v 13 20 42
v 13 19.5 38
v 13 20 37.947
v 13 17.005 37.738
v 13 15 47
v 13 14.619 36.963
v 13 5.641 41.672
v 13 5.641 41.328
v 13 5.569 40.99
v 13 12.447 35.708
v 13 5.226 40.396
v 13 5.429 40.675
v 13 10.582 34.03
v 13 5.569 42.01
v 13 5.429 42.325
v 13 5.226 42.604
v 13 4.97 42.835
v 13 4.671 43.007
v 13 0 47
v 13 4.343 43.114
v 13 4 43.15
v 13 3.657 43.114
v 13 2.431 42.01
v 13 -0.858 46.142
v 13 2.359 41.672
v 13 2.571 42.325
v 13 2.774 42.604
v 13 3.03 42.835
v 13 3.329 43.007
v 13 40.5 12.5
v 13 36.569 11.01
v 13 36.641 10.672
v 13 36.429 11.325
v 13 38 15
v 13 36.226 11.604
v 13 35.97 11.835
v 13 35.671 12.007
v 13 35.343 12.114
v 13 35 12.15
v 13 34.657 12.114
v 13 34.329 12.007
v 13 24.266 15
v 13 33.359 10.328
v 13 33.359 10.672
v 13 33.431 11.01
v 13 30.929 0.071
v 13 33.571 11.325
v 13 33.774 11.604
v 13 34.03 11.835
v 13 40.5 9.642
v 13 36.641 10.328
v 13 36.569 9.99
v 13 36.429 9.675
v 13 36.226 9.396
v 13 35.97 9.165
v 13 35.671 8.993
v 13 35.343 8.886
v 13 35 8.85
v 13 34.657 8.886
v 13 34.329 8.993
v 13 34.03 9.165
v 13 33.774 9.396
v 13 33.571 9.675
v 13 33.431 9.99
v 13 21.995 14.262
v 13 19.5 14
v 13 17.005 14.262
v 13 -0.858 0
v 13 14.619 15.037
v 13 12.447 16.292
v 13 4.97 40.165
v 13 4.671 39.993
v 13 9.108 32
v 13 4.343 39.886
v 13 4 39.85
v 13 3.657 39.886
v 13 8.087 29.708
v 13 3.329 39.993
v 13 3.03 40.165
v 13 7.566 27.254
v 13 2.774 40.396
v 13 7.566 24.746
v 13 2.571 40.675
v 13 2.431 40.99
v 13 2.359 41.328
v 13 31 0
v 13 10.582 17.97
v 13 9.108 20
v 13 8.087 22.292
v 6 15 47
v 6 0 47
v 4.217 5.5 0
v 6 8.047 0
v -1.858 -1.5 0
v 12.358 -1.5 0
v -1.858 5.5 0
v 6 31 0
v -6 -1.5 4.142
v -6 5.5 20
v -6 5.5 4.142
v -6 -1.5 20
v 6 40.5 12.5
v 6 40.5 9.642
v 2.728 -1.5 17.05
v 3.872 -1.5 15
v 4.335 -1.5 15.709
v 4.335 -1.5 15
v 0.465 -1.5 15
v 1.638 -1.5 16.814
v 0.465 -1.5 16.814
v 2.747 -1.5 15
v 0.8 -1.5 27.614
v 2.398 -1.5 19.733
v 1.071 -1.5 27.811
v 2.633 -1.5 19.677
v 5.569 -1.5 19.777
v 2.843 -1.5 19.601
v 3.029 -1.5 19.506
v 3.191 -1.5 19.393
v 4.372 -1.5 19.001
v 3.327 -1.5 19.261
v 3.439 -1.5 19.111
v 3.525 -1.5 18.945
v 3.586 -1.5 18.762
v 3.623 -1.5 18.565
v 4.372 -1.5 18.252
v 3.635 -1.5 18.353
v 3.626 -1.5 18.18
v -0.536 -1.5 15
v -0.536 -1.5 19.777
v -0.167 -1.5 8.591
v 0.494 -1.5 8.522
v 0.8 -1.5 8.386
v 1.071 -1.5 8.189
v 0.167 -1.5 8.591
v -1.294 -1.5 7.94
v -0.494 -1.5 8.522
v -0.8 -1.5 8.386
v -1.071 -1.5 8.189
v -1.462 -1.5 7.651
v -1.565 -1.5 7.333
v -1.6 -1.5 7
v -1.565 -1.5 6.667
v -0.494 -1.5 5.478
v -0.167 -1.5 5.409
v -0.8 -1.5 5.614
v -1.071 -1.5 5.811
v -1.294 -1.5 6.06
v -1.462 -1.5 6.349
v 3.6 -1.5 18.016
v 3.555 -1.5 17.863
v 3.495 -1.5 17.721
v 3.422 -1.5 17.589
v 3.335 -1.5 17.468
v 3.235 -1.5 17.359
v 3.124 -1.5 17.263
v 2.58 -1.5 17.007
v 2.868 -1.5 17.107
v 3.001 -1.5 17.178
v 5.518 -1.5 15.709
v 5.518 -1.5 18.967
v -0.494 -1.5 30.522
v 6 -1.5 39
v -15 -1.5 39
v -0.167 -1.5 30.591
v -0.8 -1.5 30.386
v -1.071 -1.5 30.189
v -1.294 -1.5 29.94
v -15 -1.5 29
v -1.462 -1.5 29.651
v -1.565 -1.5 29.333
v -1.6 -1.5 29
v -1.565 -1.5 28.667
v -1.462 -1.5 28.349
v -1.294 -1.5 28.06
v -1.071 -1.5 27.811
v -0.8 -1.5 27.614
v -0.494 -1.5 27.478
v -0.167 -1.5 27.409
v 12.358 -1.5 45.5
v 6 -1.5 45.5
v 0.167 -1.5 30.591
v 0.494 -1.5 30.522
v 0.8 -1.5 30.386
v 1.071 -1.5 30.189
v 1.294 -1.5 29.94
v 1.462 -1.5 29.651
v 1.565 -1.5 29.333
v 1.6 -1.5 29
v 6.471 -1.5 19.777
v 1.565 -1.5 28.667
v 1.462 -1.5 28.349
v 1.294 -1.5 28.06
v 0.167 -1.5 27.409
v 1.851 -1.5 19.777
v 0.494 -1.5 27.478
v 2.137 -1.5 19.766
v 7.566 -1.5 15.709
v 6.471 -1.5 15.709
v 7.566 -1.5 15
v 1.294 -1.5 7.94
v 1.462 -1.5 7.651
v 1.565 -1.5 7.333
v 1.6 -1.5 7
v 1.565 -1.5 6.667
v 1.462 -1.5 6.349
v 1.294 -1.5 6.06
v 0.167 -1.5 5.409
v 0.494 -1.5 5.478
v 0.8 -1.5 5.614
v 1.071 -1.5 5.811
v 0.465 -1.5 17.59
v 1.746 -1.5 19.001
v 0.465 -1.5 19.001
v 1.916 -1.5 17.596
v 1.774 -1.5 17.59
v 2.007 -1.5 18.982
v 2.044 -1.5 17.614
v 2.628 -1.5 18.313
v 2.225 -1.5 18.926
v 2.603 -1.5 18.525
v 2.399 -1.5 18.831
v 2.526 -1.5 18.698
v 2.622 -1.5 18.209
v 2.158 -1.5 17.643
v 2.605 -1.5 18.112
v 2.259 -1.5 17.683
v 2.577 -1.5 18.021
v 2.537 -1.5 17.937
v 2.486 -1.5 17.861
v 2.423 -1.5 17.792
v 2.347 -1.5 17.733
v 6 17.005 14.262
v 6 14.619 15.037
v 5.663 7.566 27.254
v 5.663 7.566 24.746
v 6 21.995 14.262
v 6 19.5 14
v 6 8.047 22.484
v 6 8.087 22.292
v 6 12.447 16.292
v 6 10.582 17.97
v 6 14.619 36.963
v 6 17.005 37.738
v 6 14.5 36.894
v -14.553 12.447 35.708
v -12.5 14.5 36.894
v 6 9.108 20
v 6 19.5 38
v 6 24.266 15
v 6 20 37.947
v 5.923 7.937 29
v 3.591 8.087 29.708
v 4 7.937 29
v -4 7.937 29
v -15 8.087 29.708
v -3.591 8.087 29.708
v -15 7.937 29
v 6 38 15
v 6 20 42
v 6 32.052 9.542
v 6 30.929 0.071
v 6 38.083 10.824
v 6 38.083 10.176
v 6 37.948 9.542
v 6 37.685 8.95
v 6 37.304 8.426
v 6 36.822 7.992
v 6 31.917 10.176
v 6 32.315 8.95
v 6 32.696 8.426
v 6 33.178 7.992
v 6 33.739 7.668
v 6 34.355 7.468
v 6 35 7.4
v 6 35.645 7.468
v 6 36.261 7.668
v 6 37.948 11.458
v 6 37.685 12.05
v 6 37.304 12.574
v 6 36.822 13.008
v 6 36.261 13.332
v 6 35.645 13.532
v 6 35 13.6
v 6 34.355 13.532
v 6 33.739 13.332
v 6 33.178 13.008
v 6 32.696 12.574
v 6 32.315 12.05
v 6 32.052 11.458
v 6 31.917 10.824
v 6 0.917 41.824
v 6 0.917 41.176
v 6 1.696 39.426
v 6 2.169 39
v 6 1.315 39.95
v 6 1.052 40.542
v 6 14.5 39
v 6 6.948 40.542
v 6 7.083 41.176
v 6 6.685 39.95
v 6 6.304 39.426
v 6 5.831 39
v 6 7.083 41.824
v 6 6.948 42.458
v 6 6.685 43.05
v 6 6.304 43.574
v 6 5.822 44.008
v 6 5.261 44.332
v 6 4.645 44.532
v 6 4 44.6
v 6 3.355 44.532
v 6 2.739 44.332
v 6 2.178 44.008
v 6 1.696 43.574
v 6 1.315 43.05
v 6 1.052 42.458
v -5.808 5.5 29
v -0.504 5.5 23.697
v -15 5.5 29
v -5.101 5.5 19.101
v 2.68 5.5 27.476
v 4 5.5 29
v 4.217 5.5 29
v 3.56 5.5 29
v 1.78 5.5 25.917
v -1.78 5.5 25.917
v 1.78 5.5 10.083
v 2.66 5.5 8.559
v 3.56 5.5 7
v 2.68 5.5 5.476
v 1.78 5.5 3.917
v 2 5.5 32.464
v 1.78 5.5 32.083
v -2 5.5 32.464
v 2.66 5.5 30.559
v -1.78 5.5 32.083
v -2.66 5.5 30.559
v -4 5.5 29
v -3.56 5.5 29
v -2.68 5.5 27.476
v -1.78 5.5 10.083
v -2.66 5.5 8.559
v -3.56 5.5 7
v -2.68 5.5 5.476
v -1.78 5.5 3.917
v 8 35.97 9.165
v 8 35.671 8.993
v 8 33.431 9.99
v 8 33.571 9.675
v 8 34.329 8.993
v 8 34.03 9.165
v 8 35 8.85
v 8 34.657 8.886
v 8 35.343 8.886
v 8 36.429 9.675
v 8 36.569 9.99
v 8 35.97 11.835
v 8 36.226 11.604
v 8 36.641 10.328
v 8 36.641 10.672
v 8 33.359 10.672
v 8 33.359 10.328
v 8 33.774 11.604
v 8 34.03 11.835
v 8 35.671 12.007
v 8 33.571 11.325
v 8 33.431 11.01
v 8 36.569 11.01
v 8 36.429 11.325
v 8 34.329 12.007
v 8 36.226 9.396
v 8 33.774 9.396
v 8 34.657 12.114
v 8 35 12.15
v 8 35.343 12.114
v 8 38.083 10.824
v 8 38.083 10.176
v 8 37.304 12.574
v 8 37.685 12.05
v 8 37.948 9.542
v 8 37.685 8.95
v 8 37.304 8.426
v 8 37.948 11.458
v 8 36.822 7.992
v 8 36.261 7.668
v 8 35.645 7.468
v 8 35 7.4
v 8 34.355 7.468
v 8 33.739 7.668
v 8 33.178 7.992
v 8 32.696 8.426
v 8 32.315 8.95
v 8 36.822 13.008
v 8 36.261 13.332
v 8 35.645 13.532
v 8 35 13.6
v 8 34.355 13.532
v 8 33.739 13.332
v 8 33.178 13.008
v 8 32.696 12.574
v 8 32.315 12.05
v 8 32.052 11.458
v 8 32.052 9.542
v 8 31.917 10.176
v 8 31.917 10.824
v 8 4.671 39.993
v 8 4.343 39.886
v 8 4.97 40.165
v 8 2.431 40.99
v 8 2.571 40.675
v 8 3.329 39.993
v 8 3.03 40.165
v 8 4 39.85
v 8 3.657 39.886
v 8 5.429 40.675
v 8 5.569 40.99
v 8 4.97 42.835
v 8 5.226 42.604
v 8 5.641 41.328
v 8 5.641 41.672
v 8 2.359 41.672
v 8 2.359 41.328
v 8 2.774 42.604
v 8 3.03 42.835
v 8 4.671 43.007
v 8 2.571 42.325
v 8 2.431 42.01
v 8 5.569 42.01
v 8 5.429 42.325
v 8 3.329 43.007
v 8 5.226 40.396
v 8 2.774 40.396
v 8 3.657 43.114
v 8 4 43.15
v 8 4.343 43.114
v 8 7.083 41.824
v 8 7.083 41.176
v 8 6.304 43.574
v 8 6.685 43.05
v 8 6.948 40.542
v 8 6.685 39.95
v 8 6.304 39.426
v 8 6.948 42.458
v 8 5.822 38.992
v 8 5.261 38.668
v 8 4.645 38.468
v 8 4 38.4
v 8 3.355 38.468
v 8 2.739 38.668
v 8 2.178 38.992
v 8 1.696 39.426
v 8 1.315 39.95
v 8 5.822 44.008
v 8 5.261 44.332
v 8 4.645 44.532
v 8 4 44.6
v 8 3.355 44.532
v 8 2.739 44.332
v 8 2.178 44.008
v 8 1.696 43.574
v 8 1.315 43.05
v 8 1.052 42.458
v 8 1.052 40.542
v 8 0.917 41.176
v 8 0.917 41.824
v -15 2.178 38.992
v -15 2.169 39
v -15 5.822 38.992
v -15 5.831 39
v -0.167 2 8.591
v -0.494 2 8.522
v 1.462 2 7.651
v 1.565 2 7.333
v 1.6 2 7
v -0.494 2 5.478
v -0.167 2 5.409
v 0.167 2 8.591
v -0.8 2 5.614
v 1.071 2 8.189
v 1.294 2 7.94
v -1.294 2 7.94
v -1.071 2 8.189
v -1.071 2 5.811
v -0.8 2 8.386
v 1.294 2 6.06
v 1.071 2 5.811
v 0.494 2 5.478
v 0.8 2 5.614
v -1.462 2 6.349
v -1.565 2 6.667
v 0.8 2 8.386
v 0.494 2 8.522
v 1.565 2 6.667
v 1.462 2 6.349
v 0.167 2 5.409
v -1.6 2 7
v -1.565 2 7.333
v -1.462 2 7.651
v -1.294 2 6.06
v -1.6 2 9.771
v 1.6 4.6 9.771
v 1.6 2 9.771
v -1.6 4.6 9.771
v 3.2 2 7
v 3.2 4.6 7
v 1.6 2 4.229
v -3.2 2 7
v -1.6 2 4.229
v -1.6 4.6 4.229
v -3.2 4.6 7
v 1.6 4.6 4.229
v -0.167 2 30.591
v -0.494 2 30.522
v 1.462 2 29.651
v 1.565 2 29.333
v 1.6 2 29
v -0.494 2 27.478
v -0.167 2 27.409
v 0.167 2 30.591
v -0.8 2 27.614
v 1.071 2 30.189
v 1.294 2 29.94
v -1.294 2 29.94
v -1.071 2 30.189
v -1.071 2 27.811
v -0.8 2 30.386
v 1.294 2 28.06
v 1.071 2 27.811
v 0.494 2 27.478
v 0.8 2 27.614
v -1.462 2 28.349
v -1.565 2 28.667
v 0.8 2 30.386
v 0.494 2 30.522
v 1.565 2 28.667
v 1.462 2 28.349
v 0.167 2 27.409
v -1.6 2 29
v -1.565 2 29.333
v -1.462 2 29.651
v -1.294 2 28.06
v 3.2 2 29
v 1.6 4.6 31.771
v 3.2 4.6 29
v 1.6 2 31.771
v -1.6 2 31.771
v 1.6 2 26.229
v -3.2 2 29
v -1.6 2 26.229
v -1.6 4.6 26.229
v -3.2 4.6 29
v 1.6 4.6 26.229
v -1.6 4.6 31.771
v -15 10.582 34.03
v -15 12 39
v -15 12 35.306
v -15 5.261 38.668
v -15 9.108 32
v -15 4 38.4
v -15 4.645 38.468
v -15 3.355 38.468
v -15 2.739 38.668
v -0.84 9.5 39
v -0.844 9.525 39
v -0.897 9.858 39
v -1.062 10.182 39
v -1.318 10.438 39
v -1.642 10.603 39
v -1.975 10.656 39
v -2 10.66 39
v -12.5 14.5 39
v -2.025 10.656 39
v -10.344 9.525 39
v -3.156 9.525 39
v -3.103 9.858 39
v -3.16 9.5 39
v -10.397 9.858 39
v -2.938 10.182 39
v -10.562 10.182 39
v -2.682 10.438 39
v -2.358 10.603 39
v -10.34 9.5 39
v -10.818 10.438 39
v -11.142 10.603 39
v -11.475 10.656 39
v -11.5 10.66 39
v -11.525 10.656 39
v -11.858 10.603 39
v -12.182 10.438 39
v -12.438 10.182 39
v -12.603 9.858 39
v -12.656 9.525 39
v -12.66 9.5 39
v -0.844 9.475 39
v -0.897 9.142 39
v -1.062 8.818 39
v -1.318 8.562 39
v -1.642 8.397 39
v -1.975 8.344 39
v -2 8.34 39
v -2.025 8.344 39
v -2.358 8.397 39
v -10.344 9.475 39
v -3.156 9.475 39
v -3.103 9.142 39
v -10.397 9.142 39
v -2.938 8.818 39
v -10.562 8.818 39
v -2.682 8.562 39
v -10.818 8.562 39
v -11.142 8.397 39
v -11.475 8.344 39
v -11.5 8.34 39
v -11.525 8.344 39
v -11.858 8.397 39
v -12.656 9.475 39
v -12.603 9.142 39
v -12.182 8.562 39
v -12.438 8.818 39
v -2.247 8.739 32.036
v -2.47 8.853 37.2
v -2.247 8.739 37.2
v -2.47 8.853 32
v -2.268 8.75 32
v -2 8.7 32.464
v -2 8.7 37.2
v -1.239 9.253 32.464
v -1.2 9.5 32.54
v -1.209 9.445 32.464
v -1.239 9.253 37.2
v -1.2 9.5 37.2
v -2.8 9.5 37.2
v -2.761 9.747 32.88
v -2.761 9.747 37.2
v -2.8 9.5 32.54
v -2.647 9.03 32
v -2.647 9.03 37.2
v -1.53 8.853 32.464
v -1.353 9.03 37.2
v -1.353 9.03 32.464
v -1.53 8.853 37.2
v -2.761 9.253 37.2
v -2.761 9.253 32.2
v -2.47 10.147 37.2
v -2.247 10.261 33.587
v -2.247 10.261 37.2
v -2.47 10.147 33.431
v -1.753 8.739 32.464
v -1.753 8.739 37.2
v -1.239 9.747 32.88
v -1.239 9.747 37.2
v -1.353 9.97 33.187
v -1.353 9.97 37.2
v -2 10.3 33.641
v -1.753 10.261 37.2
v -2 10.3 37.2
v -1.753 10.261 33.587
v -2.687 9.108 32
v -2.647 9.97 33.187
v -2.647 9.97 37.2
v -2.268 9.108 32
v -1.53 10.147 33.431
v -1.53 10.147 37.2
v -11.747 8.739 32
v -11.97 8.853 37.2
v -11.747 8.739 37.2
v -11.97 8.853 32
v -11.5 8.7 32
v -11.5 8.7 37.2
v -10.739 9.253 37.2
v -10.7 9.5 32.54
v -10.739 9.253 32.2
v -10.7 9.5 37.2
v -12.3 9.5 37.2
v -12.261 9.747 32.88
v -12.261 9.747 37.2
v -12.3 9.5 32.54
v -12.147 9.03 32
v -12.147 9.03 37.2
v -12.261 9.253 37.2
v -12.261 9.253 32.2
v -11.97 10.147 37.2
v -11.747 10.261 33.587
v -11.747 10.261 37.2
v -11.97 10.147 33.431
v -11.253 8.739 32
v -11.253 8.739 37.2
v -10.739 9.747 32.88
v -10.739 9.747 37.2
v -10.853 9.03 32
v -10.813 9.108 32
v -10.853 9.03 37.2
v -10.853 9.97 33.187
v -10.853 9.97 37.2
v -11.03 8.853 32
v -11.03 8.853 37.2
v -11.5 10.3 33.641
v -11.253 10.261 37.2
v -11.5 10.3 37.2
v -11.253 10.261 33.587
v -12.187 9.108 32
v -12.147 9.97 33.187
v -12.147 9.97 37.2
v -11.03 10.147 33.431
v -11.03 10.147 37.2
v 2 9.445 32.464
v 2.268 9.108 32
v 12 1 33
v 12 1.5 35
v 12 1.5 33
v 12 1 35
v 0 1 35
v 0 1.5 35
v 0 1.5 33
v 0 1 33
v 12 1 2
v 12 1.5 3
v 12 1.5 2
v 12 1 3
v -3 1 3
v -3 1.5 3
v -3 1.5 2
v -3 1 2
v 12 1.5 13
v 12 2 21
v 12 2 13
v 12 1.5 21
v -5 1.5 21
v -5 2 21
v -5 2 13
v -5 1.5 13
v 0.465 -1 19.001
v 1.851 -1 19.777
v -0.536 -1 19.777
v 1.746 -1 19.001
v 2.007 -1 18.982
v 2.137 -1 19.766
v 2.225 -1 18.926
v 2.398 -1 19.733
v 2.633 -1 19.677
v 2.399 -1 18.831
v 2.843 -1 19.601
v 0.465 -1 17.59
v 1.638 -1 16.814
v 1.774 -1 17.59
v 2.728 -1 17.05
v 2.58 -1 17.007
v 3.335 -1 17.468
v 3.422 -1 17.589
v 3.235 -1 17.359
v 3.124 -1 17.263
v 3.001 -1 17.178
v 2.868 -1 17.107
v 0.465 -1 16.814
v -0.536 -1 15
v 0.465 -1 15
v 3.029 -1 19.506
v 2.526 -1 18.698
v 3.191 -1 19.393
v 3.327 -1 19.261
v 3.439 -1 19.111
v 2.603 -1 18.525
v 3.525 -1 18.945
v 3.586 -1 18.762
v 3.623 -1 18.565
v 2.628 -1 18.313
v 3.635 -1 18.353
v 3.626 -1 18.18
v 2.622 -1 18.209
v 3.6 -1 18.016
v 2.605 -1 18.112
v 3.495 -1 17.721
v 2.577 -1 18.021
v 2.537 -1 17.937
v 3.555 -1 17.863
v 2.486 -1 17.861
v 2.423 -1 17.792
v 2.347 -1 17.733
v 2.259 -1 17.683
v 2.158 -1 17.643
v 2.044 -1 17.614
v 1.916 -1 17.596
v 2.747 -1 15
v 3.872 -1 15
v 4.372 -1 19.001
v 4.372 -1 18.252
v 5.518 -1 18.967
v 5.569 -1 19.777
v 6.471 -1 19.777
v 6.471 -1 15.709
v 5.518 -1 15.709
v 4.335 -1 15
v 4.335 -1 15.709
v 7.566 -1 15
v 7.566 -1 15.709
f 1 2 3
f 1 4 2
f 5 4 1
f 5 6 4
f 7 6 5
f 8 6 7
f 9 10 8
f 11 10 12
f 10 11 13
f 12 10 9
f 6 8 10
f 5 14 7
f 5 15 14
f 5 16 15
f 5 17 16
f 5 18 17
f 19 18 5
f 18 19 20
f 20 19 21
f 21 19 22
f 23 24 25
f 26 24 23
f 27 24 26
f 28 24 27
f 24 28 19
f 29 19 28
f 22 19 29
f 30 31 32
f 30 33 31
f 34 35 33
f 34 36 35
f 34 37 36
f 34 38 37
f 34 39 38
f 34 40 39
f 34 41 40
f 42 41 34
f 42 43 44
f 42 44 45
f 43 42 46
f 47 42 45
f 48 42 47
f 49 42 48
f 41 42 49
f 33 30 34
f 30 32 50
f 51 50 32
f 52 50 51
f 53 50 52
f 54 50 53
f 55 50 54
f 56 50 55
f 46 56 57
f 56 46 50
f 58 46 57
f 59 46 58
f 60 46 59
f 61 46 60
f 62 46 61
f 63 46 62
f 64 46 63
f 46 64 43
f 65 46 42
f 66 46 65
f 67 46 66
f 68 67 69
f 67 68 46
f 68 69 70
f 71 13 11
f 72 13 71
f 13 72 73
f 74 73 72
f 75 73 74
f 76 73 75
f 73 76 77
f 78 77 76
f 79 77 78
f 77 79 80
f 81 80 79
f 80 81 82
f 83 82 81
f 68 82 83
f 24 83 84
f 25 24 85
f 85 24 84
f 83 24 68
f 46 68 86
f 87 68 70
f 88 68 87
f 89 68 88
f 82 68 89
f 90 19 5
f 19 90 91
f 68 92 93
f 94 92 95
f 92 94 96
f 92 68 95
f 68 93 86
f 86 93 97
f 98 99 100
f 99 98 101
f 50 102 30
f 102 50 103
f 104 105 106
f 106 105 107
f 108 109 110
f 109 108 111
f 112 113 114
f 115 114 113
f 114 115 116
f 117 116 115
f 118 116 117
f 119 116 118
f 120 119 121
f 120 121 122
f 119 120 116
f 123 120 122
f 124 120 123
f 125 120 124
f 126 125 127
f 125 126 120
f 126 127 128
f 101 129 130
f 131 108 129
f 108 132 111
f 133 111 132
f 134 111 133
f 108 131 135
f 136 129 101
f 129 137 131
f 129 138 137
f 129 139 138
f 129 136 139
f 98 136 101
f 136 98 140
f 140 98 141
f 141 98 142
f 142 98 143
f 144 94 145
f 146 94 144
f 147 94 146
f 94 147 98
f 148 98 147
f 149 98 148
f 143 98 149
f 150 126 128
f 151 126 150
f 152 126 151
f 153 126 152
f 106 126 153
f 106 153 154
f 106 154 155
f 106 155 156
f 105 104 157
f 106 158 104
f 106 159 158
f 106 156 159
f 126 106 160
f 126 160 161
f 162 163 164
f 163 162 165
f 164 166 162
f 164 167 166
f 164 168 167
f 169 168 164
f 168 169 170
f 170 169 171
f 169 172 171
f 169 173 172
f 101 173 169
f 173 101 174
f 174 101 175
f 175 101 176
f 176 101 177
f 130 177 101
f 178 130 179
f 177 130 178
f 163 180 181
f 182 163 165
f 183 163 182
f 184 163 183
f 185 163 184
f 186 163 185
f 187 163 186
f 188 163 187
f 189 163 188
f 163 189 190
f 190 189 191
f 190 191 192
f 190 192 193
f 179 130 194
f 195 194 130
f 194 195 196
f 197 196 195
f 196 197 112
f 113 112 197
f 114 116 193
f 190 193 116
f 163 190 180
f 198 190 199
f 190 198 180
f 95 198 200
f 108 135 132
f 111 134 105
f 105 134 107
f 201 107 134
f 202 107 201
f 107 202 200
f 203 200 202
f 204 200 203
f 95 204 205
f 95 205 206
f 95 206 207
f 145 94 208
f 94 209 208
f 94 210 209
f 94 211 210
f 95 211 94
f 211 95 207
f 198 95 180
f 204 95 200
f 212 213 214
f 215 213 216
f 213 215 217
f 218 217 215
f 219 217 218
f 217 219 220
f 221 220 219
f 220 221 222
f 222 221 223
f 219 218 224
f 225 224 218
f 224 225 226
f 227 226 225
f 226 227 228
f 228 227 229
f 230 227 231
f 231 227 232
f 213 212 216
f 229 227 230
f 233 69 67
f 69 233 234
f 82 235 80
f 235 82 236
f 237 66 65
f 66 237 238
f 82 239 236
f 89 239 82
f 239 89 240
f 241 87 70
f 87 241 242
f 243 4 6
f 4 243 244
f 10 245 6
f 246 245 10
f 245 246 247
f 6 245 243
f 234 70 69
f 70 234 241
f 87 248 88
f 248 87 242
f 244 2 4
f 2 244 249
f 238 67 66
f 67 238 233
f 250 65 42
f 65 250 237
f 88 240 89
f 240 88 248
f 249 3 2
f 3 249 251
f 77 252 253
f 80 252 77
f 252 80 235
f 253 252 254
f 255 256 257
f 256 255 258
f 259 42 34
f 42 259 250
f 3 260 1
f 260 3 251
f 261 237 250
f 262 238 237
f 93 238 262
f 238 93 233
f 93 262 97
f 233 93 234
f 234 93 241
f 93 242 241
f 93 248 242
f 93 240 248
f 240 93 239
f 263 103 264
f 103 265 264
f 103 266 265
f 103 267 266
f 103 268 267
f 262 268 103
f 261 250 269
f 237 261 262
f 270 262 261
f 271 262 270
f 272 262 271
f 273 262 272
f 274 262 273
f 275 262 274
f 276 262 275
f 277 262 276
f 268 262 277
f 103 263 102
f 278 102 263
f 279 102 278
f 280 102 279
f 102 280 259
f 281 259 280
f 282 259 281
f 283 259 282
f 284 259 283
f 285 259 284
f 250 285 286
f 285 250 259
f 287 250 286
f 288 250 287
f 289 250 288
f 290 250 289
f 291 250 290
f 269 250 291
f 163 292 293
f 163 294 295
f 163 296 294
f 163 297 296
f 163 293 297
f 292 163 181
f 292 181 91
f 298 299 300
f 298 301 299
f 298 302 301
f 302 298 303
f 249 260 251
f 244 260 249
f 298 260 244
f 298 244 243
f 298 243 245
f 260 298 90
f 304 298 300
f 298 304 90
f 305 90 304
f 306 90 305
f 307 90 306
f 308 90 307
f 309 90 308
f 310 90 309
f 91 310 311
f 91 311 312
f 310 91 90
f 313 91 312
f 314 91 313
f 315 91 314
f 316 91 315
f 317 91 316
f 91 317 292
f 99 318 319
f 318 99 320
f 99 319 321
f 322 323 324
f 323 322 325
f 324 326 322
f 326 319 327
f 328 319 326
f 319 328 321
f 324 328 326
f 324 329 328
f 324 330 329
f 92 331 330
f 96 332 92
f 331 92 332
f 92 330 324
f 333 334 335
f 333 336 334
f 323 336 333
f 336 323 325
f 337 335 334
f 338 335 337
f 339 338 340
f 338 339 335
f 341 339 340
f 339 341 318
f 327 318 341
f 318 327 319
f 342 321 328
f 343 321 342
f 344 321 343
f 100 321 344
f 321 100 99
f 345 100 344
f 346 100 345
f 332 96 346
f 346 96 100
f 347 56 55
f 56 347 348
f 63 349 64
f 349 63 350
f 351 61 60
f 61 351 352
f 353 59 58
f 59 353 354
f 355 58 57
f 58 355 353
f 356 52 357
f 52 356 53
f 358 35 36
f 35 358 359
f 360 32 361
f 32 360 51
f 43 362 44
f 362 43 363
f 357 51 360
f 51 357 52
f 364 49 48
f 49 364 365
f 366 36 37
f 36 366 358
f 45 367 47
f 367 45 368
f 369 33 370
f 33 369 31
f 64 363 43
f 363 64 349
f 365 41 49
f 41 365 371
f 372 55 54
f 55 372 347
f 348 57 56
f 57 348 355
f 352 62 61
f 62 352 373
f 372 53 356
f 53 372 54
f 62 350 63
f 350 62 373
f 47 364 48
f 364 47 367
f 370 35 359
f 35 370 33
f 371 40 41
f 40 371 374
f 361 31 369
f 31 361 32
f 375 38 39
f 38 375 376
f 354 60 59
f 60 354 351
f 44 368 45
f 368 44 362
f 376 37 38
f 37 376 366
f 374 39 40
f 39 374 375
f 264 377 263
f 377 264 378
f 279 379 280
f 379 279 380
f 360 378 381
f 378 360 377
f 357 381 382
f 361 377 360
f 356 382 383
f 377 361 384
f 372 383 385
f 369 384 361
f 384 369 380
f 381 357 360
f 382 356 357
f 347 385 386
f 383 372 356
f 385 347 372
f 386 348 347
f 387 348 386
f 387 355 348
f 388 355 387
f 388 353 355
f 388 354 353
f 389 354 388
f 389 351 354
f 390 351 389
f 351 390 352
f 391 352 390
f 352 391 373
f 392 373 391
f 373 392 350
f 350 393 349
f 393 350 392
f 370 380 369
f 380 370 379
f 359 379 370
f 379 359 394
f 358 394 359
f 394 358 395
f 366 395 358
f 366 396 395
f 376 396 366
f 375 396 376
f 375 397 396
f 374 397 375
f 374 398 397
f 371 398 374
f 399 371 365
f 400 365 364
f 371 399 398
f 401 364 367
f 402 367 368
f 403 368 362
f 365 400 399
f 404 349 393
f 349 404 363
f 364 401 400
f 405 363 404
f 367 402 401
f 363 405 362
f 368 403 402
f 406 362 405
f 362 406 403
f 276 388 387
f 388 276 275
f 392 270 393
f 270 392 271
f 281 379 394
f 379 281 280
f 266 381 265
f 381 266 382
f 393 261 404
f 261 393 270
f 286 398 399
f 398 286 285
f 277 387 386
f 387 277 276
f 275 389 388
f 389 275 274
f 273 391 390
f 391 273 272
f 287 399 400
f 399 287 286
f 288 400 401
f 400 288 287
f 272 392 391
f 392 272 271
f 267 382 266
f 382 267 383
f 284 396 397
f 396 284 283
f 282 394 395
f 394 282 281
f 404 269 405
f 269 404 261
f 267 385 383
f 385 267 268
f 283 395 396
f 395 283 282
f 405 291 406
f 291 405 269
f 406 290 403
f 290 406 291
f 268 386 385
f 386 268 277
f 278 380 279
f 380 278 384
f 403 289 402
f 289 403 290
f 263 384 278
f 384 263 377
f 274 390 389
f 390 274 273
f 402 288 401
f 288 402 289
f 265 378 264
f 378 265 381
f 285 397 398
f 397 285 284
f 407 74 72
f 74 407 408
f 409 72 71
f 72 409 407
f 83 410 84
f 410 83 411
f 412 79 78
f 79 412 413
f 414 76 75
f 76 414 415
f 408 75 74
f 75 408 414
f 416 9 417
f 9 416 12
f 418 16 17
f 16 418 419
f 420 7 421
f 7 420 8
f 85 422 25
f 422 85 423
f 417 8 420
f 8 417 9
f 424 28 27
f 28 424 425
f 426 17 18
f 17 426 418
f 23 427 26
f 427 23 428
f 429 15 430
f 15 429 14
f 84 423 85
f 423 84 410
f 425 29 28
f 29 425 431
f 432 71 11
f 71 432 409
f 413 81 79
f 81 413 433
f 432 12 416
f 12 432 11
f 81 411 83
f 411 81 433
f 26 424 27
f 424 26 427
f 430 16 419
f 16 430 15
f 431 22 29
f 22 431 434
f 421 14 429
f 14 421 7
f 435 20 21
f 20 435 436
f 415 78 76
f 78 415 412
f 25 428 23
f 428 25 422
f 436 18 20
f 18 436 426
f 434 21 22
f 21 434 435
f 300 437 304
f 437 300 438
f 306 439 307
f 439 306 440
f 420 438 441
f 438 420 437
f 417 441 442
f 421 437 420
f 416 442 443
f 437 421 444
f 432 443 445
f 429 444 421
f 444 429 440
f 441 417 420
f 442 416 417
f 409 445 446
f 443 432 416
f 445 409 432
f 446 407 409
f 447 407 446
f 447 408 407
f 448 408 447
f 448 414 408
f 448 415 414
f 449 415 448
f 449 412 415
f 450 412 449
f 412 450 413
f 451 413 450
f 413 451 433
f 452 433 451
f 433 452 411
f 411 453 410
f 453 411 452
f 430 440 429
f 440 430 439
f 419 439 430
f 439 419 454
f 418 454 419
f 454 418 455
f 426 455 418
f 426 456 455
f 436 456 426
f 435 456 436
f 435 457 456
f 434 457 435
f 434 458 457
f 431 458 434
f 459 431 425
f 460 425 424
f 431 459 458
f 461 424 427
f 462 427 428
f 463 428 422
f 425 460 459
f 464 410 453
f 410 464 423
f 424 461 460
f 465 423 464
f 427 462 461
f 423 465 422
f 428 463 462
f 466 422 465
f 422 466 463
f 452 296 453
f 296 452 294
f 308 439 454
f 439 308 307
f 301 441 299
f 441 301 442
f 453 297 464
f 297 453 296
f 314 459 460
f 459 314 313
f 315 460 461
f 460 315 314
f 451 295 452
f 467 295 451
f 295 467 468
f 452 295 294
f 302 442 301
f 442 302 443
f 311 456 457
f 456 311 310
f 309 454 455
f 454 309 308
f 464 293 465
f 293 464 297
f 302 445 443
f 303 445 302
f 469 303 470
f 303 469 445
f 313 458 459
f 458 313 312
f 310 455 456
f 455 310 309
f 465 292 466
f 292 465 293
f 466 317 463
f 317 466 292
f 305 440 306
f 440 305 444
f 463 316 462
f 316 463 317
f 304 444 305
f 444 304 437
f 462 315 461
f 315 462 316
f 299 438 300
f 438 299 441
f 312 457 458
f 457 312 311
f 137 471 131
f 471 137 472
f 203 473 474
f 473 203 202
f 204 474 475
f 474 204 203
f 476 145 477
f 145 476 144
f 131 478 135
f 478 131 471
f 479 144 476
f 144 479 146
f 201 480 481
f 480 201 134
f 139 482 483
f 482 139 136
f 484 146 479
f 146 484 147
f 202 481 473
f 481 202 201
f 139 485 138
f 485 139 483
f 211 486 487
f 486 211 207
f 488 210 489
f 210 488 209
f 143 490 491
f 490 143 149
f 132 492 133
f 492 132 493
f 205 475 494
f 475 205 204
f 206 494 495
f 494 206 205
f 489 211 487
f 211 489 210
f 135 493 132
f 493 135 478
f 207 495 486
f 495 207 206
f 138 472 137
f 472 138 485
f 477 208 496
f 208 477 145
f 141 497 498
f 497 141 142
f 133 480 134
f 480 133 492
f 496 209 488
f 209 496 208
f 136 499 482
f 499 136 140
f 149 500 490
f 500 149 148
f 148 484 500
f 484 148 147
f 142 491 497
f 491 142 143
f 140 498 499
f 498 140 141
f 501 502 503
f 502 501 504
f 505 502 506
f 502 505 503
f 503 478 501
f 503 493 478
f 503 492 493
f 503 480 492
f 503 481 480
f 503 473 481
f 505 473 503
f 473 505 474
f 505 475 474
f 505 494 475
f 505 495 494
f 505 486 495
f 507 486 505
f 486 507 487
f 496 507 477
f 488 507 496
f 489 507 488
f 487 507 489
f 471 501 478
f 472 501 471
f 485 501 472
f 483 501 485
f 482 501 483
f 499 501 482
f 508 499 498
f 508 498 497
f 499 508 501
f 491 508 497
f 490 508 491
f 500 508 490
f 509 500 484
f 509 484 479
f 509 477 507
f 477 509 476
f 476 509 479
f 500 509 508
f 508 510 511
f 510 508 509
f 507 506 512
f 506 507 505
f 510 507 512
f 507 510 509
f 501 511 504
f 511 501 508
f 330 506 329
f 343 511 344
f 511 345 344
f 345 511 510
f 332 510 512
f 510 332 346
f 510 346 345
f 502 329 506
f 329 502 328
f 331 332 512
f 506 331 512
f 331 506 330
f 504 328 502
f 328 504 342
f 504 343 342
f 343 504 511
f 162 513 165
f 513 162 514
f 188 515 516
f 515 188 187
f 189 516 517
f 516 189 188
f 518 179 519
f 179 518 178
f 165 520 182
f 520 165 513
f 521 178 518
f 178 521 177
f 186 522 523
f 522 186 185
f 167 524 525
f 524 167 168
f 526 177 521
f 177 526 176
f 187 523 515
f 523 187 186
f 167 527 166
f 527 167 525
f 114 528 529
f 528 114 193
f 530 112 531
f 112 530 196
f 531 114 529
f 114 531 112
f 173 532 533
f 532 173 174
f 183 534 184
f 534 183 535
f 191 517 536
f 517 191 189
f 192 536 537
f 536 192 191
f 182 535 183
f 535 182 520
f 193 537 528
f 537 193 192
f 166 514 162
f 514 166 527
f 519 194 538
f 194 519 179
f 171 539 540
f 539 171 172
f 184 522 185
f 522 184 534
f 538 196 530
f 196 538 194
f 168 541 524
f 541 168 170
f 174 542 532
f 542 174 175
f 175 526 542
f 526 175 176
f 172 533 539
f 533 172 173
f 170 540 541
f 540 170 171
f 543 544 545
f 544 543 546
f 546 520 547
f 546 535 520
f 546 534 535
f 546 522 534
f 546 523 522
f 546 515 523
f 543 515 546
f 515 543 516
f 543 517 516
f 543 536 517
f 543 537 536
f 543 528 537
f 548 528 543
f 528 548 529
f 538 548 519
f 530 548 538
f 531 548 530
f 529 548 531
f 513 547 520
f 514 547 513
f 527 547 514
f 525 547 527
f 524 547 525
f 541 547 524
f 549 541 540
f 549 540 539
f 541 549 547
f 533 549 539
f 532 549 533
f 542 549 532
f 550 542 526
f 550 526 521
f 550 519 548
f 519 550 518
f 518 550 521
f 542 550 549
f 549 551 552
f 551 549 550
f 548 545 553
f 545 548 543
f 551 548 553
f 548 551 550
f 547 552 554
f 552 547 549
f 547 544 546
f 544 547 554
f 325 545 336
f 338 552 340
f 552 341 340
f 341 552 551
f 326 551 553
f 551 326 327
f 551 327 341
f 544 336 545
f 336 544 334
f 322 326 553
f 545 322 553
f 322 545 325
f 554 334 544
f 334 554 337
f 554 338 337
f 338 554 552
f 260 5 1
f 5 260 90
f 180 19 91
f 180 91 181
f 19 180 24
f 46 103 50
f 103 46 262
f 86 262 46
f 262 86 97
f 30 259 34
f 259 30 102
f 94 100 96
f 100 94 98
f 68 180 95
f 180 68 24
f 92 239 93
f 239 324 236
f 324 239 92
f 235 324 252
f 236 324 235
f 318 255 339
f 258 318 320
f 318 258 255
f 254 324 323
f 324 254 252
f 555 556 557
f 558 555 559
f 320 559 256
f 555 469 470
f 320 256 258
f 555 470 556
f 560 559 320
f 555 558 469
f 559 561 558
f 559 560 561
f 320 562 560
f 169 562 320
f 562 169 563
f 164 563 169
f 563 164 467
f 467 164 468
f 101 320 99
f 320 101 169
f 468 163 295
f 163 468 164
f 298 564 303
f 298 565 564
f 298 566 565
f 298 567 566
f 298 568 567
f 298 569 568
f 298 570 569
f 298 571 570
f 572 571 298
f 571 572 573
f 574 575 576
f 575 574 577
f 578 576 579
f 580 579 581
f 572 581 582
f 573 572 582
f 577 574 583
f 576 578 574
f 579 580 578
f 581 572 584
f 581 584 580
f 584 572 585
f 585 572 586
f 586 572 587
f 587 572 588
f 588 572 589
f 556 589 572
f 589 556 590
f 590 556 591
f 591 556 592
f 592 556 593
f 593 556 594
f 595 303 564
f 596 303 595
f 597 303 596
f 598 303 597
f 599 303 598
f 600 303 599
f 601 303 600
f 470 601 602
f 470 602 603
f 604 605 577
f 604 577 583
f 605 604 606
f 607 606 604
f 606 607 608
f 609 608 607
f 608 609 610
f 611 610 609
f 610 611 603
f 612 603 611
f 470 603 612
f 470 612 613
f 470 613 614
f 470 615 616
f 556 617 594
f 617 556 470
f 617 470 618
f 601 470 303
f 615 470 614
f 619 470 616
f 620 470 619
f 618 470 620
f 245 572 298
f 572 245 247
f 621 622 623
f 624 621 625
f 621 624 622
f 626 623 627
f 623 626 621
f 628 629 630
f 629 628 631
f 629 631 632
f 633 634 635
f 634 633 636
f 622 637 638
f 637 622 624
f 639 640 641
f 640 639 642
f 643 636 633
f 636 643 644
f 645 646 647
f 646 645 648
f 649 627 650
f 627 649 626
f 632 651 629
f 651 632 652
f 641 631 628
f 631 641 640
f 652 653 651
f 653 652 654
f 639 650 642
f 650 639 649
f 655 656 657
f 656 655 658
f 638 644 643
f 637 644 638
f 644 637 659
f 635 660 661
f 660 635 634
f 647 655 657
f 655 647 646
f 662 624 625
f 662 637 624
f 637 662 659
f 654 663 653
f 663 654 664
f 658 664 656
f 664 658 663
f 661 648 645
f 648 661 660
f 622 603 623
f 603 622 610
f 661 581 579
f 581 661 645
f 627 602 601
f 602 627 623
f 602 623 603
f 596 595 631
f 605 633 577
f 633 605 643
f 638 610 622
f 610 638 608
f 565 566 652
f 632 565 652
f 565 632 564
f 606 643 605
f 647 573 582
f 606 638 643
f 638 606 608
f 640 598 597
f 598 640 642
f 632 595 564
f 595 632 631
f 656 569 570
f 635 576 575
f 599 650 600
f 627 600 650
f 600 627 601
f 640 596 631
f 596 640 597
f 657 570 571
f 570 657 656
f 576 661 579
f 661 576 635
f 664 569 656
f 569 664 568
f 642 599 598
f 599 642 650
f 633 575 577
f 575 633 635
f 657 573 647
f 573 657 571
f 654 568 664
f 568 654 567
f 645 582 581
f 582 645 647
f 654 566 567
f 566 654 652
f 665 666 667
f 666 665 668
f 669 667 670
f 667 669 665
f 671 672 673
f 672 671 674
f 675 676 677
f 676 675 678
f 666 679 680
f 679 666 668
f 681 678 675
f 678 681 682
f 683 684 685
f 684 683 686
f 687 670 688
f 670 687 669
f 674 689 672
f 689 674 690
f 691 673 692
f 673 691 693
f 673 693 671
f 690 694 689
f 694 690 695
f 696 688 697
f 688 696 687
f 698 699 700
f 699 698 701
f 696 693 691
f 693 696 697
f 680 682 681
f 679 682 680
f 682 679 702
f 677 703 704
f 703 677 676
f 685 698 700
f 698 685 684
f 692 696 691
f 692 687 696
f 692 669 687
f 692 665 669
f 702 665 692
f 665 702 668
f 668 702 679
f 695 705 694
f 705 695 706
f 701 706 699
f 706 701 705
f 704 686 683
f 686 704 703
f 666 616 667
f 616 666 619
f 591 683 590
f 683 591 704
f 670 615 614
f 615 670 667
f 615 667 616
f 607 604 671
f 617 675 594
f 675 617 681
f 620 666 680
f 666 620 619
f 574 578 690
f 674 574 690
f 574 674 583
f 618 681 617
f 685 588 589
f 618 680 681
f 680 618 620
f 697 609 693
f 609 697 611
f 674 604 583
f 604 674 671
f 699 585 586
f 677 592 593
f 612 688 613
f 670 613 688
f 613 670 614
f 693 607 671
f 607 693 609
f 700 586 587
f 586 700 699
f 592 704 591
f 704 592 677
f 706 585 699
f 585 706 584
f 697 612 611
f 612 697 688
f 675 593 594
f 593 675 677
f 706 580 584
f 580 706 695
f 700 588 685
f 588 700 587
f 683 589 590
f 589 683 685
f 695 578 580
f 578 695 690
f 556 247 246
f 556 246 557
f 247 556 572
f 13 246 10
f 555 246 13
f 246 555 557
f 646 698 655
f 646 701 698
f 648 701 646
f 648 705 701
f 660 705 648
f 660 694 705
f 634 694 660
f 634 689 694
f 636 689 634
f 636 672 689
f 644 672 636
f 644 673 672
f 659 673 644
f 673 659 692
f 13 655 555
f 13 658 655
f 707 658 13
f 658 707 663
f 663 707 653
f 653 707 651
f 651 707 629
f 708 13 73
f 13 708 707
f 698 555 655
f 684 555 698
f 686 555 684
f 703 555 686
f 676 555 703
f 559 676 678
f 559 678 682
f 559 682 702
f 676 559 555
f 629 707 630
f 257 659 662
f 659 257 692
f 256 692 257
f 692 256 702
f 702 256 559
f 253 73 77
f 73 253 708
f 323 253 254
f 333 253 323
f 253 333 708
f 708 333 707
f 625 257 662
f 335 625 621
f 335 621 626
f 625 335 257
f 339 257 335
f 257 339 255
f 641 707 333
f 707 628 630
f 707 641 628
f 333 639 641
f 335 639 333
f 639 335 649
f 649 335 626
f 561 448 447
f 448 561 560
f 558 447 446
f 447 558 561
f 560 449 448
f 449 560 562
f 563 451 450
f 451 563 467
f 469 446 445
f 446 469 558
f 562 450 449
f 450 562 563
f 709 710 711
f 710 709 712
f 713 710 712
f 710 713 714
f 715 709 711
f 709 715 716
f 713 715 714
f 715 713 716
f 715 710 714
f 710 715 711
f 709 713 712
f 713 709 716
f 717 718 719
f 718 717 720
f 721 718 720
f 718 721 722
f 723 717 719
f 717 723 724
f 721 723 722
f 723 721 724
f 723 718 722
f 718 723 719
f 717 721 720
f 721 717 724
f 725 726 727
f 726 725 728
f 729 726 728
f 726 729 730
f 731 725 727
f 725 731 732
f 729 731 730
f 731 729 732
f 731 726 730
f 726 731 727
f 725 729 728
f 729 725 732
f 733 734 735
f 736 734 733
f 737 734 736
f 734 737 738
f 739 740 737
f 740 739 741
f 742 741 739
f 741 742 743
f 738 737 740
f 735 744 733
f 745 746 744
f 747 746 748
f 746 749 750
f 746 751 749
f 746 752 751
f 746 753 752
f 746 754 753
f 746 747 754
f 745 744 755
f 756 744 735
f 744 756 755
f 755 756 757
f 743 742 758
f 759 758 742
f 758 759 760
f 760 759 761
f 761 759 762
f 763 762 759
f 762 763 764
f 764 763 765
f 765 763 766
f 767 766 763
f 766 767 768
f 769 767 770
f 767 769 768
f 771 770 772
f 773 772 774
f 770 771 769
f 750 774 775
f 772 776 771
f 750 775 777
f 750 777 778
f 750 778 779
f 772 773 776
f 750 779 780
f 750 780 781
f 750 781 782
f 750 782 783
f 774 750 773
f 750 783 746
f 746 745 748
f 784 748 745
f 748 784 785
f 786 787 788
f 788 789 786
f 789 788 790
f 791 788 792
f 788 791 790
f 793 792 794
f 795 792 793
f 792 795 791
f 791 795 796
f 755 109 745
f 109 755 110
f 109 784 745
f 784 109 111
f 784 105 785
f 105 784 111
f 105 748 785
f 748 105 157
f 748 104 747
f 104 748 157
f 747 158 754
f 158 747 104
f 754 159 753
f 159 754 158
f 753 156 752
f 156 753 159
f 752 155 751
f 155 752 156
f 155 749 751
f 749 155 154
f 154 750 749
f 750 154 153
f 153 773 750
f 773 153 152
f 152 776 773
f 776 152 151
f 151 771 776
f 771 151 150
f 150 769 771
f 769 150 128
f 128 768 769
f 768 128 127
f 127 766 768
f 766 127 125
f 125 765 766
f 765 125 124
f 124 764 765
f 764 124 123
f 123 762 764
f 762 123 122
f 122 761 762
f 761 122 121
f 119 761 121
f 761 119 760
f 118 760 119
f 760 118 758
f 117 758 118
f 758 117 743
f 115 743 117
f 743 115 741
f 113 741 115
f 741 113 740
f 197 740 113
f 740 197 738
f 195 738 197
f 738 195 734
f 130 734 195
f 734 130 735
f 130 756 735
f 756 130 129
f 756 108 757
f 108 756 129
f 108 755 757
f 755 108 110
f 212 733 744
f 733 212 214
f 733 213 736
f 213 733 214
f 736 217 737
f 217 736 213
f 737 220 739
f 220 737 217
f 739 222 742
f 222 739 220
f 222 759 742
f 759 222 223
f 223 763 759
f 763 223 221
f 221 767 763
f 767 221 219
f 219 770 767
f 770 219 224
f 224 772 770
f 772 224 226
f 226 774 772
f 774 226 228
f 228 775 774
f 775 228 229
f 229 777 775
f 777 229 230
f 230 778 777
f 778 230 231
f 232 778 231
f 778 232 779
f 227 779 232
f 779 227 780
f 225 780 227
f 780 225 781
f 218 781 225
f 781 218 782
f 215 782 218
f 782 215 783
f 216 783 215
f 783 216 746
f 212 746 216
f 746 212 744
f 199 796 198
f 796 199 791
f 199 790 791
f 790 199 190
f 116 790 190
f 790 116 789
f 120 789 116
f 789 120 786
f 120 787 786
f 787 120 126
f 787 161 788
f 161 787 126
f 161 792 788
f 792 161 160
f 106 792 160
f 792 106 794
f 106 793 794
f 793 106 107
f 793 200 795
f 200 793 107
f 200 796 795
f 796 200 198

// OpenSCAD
// PRUSA iteration4
// Y motor holder
// GNU GPL v3
// Josef Průša <iam@josefprusa.cz> and contributors
// http://www.reprap.org/wiki/Prusa_Mendel
// http://prusamendel.org

module endstop_mount() {
    difference() {
        union() {
            translate([-21+6,8,0]) cube([12-2, 5, 28]);    
            translate([-21,8-5,0]) cube([9, 10, 28]);
        }
        translate([-16,16,15]) rotate([90,0,0]) cylinder(h = 10, r=0.8, $fn=20);
        translate([-16,13.2,15]) rotate([90,0,0]) cylinder(h = 2, r1=1.2, r2=0.8, $fn=20);

        translate([-16,16,24.5]) rotate([90,0,0]) cylinder(h = 10, r=0.8, $fn=20);
        translate([-16,13.2,24.5]) rotate([90,0,0]) cylinder(h = 2, r1=1.2, r2=0.8, $fn=20);
        
        translate([-22,13.2,24.5]) rotate([90,0,0]) rotate([0, 0, 45]) cube([5, 4, 4]);
    }
}

module holder()
{
    difference()
    {
        // base body
        translate([-6,-1.5,0]) cube([19,42,47]);

        // shape cuts
        translate([-20,19.5,26]) rotate([0,90,0]) cylinder( h=35, r=12, $fn=30 );   
        translate([-11,20,15]) cube([26,23,64]);
        translate([-20,5.5,-1]) cube([26,41,64]);
        translate([-20,-5,37]) cube([26,21,20]);
        translate([-20,-1,37]) cube([26,30,20]);
        
        // lower motor screw
        translate([-20,35 ,10.5]) rotate([0,90,0]) cylinder( h=40, r=1.65, $fn=30 ); 
        translate([-7,35,10.5]) rotate([0,90,0]) cylinder( h=15, r=3.1, $fn=30 );         
        
        // upper motor screw    
        translate([-20,4,41.5]) rotate([0,90,0]) cylinder( h=40, r=1.65, $fn=30 );         
        translate([4,4,41.5]) rotate([0,90,0]) cylinder( h=4, r=3.1, $fn=30 );         
        
        // lower frame screw    
        translate([0,12,7]) rotate([90,0,0]) cylinder( h=40, r=1.6, $fn=30 ); 
        translate([0,7,7]) rotate([90,0,0]) cylinder( h=5, r=3.2, $fn=6 ); 
        translate([0,6.6,7]) rotate([90,0,0]) cylinder( h=2, r2=3.2, r1=4, $fn=6 ); 
        
        // upper frame screw    
        translate([0,12,29]) rotate([90,0,0]) cylinder( h=40, r=1.6, $fn=30 ); 
        translate([0,7,29]) rotate([90,0,0]) cylinder( h=5, r=3.2, $fn=6 ); 
        translate([0,6.6,29]) rotate([90,0,0]) cylinder( h=2, r2=3.2, r1=4, $fn=6 );

        // corners
        translate([-10,20,42]) rotate([45,0,0]) cube([60,10,10]);        
        translate([-10,-5,42]) rotate([45,0,0]) cube([60,10,10]);        
        translate([-10,38,-7]) rotate([45,0,0]) cube([60,20,10]);        
        translate([-10,43,10]) rotate([45,0,0]) cube([60,20,20]);  
        translate([-14,-10,-2]) rotate([0,45,0]) cube([10,50,10]);        
// Removed for end-stop
//        translate([-14,-10,37]) rotate([0,45,0]) cube([10,50,10]);
        translate([18,-10,-5]) rotate([0,0,45]) cube([10,10,60]);        
    }
    
    // end-stop reinforcement
    translate([-15, -1.5, 29]) cube([9, 8, 5]);
    translate([-15, -1.5, 29]) rotate([0, 45, 0]) cube([14, 7, 6.5]);
    
    // reinforcement
    translate([7.8,1.9,0]) rotate([0,0,55]) cube([5,5,18]);
    difference()
        {
            translate([7.8,1.9,13.6]) rotate([0,0,55]) cube([5,5,23.4]);
            translate([-20,19.5,26]) rotate([0,90,0]) cylinder( h=35, r=12, $fn=30 );   
        }
   
}

module y_motor_holder()
{
//    rotate([0,90,0])
    difference()
        {
            union() {
                holder();
                translate([13, -6.5, 26])  rotate([-90, 0, 0]) rotate([0, 90, 180]) endstop_mount();
            }
            
        // enstop_mount_cleanup....
        translate([18,-10,-5]) rotate([0,0,45]) cube([10,10,60]); 
        translate([-20,19.5,26]) rotate([0,90,0]) cylinder( h=35, r=12, $fn=30 );   
        translate([0,10,29]) rotate([90,0,0]) cylinder( h=4.5, r=4,  $fn=6 );

        // Upper motor mount screw
        translate([-21, 0, 0]) translate([4,4,41.5]) rotate([0,90,0]) cylinder( h=25, r=3.1, $fn=30 );         
            
        // selective infill
        translate([-0,1,33]) cube([12,0.5,2]);        
        translate([-3,1,2]) cube([15,0.5,1]);        
        translate([-5,1.5,13]) cube([17,0.5,8]);        
        
        //version
        translate([-1,-1,15]) rotate([90,0,0]) linear_extrude(height = 0.6) 
        { text("R1",font = "helvetica:style=Bold", size=5, center=true); }
        }
}    
    
y_motor_holder();    
    
    
    
